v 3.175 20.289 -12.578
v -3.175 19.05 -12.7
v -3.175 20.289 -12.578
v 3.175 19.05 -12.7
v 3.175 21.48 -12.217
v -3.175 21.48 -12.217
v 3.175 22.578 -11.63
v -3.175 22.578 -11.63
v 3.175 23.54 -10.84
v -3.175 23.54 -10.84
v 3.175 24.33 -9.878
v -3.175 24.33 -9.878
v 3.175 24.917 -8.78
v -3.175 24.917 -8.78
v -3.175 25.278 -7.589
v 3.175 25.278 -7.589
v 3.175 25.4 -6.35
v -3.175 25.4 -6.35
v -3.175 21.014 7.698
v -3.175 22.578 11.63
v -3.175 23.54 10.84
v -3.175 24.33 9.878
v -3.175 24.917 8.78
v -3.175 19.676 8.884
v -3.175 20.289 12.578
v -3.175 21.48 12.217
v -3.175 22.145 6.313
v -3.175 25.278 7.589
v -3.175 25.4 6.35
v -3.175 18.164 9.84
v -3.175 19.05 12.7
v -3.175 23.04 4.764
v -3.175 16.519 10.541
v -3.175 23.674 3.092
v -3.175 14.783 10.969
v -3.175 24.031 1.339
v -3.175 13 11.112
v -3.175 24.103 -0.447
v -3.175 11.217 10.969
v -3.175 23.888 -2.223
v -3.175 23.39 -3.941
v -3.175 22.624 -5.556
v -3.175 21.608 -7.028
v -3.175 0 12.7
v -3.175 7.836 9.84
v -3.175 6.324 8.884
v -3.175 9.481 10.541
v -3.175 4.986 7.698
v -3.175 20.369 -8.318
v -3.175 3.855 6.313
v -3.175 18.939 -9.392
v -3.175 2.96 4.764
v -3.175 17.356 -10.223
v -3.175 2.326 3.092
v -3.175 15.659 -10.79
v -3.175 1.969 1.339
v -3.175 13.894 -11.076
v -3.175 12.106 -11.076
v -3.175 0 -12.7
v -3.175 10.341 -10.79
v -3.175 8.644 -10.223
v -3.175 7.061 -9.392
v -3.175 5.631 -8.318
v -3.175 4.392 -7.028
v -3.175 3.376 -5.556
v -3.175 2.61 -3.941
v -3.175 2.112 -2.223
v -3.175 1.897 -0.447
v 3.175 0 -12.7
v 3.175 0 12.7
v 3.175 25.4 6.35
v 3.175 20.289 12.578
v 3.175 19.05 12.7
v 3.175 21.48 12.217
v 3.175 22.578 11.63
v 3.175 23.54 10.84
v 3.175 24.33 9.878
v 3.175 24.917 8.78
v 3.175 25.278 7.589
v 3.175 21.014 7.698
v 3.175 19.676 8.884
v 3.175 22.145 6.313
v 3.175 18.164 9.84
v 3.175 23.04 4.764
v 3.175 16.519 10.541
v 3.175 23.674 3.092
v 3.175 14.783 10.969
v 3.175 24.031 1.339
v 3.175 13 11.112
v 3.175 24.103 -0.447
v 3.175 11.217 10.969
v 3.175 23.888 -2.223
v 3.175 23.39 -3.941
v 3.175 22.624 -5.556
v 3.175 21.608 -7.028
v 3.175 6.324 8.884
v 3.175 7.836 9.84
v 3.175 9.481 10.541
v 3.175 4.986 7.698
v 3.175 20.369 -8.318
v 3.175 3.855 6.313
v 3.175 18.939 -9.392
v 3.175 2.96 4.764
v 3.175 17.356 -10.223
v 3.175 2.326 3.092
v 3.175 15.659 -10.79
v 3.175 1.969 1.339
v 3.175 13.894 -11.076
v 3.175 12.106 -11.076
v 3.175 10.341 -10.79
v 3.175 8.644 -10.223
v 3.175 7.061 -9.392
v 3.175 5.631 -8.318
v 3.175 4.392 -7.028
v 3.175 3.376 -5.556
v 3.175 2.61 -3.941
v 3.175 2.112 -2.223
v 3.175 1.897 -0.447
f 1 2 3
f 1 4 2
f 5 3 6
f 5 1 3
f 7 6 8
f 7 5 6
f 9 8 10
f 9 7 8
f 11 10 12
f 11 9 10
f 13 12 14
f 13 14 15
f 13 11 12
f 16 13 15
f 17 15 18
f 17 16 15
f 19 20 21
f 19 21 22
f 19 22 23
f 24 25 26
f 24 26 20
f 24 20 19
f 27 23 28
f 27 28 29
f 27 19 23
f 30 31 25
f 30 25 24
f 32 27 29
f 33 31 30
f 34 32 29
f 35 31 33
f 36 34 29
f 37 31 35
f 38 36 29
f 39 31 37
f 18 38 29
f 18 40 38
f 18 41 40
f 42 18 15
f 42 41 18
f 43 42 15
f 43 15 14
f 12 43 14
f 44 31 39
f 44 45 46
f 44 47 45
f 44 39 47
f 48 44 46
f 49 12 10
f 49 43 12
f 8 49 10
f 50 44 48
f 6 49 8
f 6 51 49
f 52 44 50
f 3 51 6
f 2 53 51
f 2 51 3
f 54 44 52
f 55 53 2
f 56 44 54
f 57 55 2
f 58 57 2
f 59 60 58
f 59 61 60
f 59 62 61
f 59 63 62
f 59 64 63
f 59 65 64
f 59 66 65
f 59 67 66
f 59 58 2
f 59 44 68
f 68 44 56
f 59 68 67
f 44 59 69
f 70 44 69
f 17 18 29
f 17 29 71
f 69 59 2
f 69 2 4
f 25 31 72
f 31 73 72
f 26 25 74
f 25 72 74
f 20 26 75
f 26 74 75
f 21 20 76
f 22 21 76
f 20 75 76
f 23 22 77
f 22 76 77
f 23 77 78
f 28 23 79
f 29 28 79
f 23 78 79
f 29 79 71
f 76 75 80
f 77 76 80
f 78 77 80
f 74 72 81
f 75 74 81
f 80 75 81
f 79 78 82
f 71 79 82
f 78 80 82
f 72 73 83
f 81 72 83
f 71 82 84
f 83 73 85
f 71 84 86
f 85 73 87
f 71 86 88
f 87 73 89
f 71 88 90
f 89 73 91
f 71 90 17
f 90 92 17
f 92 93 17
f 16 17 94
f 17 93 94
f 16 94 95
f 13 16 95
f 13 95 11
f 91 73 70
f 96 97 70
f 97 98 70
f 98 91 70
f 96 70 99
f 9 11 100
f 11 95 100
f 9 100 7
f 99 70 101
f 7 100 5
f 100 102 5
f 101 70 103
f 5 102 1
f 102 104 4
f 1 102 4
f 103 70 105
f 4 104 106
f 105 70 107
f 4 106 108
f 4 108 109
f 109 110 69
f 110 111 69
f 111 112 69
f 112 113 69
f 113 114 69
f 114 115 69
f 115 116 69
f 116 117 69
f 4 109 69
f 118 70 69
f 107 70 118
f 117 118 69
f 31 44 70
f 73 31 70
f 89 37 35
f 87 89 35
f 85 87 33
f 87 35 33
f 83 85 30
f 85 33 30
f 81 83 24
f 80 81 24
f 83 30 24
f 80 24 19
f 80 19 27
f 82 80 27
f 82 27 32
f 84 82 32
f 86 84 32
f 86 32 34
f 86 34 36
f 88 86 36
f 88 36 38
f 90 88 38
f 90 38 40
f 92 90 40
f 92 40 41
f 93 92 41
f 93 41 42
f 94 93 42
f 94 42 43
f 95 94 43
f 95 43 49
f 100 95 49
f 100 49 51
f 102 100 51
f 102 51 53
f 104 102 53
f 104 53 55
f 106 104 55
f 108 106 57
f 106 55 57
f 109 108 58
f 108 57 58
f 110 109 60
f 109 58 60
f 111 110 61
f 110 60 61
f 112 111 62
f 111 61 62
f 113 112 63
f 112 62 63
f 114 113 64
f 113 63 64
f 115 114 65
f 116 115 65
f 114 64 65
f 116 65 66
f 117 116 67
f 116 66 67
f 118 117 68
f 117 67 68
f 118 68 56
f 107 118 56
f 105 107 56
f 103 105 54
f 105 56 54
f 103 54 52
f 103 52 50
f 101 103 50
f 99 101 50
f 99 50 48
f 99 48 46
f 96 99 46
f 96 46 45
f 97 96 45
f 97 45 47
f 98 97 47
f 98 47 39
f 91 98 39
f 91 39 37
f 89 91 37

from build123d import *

# Parameters (mm, degrees)
SKETCH1_W           = 6.35
SKETCH1_H           = 25.4
BOSS_EXTRUDE1_DEPTH = 25.4
FILLET1_R           = 6.35
SKETCH2_R           = 11.1125
CUT_EXTRUDE1_DEPTH  = 7.35


with BuildPart() as part:
    # Sketch1 → Boss-Extrude1 (new body)
    with BuildSketch(Plane(origin=(0, 0, 0), x_dir=(1, 0, 0), z_dir=(0, 1, 0))):
        Rectangle(SKETCH1_W, SKETCH1_H)
    extrude(amount=BOSS_EXTRUDE1_DEPTH)

    # Fillet1
    fillet1_edges = [part.edges().sort_by_distance(p)[0] for p in [
        (0, 25.4, 12.7),
        (0, 25.4, -12.7),
    ]]
    fillet(fillet1_edges, radius=FILLET1_R)

    # Sketch2 → Cut-Extrude1 (cut, through all)
    with BuildSketch(Plane.ZY.offset(3.175)):
        with Locations((0, 13)):
            Circle(SKETCH2_R)
    extrude(amount=-CUT_EXTRUDE1_DEPTH, mode=Mode.SUBTRACT)


solid = part.part
